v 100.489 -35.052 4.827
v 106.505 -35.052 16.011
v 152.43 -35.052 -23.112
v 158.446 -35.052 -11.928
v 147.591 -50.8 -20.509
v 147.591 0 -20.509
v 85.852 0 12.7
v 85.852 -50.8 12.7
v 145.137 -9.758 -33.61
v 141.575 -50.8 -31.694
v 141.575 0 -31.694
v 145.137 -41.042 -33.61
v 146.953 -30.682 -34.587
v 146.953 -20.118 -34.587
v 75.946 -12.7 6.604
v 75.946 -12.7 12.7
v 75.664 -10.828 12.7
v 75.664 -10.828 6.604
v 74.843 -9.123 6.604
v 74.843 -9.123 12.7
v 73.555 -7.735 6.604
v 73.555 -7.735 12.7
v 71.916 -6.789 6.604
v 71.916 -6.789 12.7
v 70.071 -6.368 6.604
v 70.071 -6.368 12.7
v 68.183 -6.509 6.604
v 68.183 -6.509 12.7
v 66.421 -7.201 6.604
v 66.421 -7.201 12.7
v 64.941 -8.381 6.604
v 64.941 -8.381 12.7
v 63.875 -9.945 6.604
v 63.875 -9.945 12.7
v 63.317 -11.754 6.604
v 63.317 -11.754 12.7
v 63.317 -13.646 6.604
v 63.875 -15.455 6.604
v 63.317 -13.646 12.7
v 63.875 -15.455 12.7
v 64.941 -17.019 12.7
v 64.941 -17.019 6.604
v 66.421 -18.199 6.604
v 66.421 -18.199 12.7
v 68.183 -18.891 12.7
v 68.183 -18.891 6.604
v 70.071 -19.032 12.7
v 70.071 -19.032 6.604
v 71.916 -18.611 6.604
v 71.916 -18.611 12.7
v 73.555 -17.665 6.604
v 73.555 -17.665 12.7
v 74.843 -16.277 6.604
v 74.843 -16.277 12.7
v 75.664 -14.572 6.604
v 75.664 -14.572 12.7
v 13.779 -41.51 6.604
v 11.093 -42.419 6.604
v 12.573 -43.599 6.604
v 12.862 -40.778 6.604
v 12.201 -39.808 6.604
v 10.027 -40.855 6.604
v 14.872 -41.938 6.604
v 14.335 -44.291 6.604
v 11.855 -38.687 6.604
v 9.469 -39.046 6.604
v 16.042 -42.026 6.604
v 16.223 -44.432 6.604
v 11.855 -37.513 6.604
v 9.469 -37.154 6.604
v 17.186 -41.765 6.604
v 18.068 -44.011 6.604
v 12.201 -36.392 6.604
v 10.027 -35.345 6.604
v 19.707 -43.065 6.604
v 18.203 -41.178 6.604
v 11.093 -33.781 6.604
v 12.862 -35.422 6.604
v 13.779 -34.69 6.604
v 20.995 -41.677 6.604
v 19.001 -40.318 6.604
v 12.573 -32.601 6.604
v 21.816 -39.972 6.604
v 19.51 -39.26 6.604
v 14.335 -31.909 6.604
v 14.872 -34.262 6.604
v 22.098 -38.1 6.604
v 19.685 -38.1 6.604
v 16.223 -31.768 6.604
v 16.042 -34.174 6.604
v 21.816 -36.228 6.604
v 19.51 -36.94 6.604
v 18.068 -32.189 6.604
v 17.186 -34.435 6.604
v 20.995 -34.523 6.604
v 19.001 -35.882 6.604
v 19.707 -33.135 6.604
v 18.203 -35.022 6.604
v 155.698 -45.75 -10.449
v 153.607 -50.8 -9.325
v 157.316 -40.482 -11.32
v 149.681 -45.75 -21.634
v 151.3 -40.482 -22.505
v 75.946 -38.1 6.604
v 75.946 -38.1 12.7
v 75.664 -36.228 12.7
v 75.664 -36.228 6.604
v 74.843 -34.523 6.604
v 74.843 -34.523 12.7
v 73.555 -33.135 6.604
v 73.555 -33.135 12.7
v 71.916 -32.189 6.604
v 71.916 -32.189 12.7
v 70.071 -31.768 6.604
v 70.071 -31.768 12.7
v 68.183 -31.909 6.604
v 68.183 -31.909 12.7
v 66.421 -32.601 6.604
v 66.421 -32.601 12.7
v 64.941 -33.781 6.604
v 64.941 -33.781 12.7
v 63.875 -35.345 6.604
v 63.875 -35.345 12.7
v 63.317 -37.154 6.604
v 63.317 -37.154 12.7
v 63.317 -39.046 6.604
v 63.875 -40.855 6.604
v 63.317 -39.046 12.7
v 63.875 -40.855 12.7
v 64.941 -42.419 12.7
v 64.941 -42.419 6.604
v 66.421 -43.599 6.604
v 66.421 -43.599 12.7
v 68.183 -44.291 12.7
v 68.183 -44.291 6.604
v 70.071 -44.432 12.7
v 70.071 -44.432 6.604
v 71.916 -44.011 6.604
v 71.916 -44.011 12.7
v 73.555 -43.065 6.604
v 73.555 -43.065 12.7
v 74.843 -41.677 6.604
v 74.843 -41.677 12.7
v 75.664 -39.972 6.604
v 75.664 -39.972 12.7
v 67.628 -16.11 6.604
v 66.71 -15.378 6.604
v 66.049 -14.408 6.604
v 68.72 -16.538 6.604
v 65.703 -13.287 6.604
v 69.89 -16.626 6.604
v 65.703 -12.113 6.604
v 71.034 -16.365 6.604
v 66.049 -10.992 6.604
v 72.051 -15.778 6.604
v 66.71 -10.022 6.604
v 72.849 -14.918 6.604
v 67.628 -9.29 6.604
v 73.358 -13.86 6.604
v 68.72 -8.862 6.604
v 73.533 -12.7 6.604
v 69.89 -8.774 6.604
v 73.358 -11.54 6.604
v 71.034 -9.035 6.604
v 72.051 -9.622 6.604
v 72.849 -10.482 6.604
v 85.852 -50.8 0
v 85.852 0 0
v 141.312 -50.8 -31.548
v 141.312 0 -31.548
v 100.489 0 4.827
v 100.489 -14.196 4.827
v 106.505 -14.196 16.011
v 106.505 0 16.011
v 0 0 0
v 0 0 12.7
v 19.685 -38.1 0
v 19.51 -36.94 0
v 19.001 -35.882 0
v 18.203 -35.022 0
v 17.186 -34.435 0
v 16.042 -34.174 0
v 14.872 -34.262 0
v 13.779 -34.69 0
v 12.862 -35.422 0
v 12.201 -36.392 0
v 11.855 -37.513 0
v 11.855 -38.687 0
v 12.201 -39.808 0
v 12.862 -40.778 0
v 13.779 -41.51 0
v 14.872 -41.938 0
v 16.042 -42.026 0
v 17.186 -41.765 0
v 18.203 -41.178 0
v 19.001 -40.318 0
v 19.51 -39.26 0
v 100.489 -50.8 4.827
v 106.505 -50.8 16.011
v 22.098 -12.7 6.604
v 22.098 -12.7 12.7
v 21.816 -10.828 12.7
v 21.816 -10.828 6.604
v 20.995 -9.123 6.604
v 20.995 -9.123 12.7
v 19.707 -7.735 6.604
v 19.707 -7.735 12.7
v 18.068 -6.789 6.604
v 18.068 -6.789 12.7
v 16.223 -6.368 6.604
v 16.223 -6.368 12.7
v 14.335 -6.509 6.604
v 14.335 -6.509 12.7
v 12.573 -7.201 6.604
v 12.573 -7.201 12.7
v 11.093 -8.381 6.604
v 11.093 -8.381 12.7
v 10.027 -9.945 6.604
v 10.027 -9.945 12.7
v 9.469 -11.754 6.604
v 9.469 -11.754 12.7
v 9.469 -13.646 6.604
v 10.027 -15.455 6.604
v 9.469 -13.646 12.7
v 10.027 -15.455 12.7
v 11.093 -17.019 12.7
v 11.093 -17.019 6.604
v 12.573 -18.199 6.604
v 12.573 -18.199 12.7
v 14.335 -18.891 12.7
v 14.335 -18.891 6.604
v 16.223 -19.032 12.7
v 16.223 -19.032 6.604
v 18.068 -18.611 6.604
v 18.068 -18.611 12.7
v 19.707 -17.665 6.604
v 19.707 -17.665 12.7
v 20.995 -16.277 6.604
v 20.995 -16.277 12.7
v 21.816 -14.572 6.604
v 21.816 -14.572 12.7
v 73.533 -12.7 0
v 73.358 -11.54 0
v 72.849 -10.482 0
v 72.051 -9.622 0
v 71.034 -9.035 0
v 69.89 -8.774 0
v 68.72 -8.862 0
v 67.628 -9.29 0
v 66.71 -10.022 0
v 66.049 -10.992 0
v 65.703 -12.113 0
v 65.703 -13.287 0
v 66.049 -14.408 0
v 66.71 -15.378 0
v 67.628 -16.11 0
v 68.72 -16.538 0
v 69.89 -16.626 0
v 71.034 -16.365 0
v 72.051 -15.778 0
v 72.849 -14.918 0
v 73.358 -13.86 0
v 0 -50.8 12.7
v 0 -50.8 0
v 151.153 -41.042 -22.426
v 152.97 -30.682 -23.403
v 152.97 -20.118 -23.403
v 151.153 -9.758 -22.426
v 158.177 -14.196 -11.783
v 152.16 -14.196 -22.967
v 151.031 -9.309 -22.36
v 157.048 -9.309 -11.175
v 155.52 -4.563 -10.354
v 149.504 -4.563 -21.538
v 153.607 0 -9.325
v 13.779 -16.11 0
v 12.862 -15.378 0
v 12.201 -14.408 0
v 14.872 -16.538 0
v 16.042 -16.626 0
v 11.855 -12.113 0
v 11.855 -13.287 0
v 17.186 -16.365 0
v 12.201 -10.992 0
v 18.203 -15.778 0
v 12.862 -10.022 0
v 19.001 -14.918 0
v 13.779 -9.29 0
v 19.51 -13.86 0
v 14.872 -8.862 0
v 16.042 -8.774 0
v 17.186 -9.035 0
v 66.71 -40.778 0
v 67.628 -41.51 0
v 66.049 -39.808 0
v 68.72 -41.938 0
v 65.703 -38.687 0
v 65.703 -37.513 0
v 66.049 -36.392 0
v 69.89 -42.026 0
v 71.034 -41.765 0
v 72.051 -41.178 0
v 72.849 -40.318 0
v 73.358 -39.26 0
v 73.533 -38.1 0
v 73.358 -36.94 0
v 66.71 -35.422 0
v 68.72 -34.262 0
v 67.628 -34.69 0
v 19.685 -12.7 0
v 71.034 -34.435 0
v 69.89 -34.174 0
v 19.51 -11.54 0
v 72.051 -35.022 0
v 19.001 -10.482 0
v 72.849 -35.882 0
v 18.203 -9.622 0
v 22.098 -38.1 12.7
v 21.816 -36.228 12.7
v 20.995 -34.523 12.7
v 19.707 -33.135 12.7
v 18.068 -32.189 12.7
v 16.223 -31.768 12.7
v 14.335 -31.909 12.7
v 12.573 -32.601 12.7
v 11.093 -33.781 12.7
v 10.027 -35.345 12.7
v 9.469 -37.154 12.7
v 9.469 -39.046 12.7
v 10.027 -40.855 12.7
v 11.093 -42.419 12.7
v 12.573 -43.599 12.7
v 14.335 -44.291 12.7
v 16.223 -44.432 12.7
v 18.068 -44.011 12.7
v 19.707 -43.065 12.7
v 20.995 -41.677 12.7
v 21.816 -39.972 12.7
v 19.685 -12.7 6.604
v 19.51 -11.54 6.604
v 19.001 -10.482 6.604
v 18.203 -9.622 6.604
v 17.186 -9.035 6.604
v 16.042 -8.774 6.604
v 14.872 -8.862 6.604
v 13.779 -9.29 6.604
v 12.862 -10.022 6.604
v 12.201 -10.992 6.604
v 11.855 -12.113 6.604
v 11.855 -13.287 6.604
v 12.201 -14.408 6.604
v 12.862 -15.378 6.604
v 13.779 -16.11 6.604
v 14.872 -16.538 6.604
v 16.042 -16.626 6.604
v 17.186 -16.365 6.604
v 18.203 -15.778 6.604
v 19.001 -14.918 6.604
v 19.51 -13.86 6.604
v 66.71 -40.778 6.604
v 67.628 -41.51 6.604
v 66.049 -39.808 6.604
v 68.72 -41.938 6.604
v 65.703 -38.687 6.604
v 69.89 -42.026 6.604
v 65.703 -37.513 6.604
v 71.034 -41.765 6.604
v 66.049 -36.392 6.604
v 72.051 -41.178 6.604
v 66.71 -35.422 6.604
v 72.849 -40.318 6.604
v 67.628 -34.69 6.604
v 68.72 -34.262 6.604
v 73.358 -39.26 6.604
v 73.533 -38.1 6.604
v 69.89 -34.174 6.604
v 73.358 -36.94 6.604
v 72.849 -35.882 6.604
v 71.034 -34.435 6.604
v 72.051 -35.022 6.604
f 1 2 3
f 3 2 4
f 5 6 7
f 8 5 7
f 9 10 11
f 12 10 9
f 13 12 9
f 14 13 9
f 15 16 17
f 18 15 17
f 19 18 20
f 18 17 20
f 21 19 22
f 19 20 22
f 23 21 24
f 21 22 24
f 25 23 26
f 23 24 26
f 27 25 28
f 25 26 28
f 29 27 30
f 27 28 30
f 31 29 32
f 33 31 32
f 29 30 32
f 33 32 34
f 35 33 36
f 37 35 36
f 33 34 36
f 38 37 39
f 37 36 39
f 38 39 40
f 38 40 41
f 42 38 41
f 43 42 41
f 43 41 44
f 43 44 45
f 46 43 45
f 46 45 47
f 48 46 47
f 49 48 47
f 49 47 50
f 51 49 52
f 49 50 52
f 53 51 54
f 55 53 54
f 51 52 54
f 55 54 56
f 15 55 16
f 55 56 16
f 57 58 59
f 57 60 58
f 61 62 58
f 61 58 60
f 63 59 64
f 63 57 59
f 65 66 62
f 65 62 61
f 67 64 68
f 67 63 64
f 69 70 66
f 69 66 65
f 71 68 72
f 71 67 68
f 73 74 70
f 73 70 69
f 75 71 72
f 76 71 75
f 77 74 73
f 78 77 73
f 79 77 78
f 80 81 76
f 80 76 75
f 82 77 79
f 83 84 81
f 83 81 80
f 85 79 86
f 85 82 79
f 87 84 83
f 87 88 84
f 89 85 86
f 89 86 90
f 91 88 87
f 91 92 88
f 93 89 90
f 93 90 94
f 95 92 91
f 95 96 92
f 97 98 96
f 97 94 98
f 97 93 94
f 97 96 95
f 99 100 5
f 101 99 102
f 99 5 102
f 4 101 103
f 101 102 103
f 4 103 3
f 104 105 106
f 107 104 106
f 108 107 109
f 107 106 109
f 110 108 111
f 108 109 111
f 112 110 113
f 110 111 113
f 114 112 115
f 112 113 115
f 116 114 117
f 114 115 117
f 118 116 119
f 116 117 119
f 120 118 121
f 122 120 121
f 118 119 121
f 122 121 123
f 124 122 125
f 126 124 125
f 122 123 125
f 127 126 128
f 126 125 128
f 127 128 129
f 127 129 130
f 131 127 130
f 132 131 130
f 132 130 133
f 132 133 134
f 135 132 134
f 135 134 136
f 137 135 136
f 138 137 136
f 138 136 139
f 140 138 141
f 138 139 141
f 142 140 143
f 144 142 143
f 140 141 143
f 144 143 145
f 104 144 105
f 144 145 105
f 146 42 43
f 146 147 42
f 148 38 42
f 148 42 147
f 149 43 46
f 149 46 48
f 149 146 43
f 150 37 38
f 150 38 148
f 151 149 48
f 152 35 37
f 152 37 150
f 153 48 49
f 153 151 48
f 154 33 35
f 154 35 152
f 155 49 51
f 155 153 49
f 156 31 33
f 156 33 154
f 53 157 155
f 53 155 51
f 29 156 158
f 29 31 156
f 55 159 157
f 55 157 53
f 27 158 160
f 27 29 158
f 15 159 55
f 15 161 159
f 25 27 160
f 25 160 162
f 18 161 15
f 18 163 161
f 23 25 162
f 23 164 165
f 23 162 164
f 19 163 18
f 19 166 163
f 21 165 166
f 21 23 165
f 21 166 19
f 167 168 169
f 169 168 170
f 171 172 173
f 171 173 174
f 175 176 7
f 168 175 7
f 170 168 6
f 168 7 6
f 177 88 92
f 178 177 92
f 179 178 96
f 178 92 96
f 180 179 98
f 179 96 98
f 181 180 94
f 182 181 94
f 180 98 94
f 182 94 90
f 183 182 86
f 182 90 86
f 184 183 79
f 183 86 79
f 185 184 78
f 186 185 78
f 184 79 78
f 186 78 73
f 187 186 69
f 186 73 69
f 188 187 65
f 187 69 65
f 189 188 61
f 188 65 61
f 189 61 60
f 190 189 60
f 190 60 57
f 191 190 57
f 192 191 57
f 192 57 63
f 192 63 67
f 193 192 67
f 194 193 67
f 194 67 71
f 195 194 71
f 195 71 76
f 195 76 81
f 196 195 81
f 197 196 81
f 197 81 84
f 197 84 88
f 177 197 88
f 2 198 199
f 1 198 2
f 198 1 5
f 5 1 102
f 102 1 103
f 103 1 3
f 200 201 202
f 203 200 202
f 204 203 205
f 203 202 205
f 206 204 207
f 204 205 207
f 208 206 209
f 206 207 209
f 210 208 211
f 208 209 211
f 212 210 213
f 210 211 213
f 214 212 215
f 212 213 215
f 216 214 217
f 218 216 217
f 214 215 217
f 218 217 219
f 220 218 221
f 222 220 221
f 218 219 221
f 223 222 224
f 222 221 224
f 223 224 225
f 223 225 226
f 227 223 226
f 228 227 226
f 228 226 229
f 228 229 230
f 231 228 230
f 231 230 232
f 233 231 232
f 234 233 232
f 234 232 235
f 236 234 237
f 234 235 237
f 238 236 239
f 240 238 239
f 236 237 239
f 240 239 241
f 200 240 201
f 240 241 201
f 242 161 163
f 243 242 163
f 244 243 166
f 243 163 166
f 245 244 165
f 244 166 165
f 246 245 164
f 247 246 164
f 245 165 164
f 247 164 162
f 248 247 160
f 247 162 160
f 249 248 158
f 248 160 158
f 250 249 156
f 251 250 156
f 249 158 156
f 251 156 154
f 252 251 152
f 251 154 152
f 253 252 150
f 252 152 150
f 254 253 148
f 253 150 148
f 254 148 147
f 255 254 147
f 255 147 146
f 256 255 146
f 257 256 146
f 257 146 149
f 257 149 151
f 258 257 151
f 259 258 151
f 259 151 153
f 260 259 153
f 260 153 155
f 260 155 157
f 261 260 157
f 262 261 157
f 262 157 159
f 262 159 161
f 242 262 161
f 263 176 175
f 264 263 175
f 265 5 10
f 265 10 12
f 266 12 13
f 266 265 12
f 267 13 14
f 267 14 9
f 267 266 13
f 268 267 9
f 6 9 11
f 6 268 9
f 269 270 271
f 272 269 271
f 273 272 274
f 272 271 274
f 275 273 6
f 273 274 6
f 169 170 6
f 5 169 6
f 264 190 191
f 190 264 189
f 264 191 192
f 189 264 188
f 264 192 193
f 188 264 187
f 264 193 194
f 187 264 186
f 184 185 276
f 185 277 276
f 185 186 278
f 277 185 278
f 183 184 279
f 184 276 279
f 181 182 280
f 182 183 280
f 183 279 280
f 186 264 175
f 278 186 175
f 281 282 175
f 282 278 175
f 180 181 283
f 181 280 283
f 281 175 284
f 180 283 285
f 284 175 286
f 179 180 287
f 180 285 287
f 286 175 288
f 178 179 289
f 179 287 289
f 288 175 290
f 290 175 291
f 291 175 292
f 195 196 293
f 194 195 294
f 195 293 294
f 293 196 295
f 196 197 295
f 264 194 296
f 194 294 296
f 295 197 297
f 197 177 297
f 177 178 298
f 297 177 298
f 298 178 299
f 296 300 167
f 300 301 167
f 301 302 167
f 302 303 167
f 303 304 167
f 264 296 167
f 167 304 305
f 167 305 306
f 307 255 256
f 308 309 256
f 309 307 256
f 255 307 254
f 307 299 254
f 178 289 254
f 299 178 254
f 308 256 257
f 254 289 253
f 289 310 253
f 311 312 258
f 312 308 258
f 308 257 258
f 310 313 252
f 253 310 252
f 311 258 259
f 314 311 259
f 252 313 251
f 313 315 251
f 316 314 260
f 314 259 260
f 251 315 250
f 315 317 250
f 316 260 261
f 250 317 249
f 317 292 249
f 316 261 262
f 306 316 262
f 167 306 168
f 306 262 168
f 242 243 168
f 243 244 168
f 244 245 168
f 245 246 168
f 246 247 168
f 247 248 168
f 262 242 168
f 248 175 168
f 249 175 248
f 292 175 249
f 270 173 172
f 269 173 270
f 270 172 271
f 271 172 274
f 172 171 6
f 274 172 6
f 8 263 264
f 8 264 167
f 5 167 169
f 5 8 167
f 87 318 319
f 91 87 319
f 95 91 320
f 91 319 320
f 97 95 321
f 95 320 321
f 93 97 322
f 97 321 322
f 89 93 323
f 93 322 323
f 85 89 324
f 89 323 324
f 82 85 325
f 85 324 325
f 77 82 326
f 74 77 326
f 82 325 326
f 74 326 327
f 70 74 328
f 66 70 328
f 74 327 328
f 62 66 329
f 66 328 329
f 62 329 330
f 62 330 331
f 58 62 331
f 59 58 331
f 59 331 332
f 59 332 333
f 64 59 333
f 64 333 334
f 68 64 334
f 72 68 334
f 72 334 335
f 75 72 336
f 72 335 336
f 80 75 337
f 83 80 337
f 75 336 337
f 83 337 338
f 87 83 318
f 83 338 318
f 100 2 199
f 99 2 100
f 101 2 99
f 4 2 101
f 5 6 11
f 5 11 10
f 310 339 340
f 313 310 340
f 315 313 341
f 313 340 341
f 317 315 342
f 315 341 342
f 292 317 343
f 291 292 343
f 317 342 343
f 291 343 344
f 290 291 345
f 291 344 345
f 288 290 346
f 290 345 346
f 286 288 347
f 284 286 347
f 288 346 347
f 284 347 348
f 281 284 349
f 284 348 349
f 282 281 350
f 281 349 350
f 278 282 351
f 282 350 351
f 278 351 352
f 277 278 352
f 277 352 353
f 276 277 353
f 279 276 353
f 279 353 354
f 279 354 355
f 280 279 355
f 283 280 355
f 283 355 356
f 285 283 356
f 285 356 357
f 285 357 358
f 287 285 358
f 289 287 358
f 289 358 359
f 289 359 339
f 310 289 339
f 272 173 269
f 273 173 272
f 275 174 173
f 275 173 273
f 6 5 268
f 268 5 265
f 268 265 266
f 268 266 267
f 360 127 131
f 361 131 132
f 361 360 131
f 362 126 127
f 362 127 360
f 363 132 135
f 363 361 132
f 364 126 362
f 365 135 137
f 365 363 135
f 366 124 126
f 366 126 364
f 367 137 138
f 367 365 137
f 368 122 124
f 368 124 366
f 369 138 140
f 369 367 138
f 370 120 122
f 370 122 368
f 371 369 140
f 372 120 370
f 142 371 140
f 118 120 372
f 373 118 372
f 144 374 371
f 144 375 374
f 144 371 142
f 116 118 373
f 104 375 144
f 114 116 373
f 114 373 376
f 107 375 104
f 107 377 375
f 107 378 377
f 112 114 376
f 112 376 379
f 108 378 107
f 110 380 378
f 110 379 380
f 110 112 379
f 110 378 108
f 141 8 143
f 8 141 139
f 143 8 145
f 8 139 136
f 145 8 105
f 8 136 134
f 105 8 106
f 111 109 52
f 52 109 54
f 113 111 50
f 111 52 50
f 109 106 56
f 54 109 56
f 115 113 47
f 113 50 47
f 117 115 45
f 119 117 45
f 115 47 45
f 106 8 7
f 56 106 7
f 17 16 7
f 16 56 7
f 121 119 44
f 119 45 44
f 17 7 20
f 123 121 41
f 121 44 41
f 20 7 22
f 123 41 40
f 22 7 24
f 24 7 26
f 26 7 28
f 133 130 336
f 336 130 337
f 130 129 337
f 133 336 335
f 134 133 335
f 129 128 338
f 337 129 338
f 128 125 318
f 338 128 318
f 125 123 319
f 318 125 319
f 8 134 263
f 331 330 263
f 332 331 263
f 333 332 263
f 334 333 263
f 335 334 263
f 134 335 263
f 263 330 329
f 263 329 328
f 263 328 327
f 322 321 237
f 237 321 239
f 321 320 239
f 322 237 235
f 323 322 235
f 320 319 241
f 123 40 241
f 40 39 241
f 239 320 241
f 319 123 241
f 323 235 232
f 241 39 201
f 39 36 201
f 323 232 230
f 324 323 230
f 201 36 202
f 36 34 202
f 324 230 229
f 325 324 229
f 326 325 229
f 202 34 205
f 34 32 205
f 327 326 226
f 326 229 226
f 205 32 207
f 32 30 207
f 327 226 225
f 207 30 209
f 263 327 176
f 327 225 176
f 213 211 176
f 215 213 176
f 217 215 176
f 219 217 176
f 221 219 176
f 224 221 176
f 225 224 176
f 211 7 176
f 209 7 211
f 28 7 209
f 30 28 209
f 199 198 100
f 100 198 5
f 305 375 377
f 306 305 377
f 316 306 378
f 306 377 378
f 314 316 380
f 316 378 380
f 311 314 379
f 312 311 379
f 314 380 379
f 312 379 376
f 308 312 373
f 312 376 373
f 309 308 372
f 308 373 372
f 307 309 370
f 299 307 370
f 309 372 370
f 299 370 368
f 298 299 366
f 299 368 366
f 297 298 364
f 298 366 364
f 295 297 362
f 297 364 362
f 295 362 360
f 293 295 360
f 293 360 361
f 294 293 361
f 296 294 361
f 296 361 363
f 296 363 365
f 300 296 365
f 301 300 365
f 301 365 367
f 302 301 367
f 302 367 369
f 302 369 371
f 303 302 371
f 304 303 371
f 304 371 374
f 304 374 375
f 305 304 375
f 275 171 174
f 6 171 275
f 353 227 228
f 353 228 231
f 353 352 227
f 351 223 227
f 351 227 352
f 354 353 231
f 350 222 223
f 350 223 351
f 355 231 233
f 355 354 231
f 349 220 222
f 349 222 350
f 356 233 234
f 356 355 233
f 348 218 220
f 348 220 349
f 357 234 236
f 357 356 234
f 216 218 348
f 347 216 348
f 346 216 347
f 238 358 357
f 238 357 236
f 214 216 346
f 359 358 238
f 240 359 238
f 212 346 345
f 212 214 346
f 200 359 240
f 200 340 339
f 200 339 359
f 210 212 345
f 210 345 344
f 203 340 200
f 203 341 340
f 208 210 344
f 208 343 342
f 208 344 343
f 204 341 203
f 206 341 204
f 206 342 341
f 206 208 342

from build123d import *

# Parameters (mm, degrees)
F1_DEPTH  = 50.8
F2_R      = 6.35
F3_DEPTH  = 6.096
F4_R      = 3.937
F5_DEPTH  = 44.2492978838
F7_DEPTH  = 12.7
F8_W      = 53.483916714
F8_H      = 50.8
F9_DEPTH  = 12.7
F10_W     = 63.1353035569
F10_H     = 20.8556866273
F11_DEPTH = 25.4


with BuildPart() as f1:
    # F0 (on Front) → F1 (new body)
    with BuildSketch(Plane.XZ):
        Polygon((0, 12.7), (0, 0), (85.852, 0), (141.3115113905, -31.5482978838), (147.5910292814, -20.5093824), (85.852, 12.7), align=None)
    extrude(amount=F1_DEPTH)

    # F2 (on face) → F3 (cut)
    with BuildSketch(Plane.XY.offset(12.7)):
        with Locations((15.748, -12.7)):
            Circle(F2_R)
        with Locations((69.596, -12.7)):
            Circle(F2_R)
        with Locations((15.748, -38.1)):
            Circle(F2_R)
        with Locations((69.596, -38.1)):
            Circle(F2_R)
    extrude(amount=-F3_DEPTH, mode=Mode.SUBTRACT)

    # F4 (on face) → F5 (cut, through all)
    with BuildSketch(Plane.XY.offset(12.7)):
        with Locations((15.748, -12.7)):
            Circle(F4_R)
        with Locations((69.596, -12.7)):
            Circle(F4_R)
        with Locations((69.596, -38.1)):
            Circle(F4_R)
        with Locations((15.748, -38.1)):
            Circle(F4_R)
    extrude(amount=-F5_DEPTH, mode=Mode.SUBTRACT)


with BuildPart() as f7:
    # F6 (on face) → F7 (new body)
    with BuildSketch(Plane(origin=(24.5640985802, 0, 45.6667210261), x_dir=(0.8806776972, 0, -0.473715942), z_dir=(0.473715942, 0, 0.8806776972))):
        with BuildLine():
            Line((139.6957491924, 0), (139.6957491924, -50.8))
            ThreePointArc((139.6957491924, -50.8), (146.0627308377, -25.4), (139.6957491924, 0))
        make_face()
    extrude(amount=-F7_DEPTH)


with BuildPart() as f9:
    # F8 (on face) → F9 (new body)
    with BuildSketch(Plane(origin=(24.5640985802, 0, 45.6667210261), x_dir=(0.8806776972, 0, -0.473715942), z_dir=(0.473715942, 0, 0.8806776972))):
        with Locations((112.9537908354, -25.4)):
            Rectangle(F8_W, F8_H)
        with BuildLine():
            Line((139.6957491924, 0), (139.6957491924, -50.8))
            ThreePointArc((139.6957491924, -50.8), (146.0627308377, -25.4), (139.6957491924, 0))
        make_face()
    extrude(amount=F9_DEPTH)

    # F10 (on face) → F11 (cut)
    with BuildSketch(Plane(origin=(30.5802910439, 0, 56.85132778), x_dir=(0.8806776972, 0, -0.473715942), z_dir=(0.473715942, 0, 0.8806776972))):
        with Locations((117.7794842569, -24.6241566863)):
            Rectangle(F10_W, F10_H)
    extrude(amount=-F11_DEPTH, mode=Mode.SUBTRACT)


solid = Compound([f1.part, f7.part, f9.part])
